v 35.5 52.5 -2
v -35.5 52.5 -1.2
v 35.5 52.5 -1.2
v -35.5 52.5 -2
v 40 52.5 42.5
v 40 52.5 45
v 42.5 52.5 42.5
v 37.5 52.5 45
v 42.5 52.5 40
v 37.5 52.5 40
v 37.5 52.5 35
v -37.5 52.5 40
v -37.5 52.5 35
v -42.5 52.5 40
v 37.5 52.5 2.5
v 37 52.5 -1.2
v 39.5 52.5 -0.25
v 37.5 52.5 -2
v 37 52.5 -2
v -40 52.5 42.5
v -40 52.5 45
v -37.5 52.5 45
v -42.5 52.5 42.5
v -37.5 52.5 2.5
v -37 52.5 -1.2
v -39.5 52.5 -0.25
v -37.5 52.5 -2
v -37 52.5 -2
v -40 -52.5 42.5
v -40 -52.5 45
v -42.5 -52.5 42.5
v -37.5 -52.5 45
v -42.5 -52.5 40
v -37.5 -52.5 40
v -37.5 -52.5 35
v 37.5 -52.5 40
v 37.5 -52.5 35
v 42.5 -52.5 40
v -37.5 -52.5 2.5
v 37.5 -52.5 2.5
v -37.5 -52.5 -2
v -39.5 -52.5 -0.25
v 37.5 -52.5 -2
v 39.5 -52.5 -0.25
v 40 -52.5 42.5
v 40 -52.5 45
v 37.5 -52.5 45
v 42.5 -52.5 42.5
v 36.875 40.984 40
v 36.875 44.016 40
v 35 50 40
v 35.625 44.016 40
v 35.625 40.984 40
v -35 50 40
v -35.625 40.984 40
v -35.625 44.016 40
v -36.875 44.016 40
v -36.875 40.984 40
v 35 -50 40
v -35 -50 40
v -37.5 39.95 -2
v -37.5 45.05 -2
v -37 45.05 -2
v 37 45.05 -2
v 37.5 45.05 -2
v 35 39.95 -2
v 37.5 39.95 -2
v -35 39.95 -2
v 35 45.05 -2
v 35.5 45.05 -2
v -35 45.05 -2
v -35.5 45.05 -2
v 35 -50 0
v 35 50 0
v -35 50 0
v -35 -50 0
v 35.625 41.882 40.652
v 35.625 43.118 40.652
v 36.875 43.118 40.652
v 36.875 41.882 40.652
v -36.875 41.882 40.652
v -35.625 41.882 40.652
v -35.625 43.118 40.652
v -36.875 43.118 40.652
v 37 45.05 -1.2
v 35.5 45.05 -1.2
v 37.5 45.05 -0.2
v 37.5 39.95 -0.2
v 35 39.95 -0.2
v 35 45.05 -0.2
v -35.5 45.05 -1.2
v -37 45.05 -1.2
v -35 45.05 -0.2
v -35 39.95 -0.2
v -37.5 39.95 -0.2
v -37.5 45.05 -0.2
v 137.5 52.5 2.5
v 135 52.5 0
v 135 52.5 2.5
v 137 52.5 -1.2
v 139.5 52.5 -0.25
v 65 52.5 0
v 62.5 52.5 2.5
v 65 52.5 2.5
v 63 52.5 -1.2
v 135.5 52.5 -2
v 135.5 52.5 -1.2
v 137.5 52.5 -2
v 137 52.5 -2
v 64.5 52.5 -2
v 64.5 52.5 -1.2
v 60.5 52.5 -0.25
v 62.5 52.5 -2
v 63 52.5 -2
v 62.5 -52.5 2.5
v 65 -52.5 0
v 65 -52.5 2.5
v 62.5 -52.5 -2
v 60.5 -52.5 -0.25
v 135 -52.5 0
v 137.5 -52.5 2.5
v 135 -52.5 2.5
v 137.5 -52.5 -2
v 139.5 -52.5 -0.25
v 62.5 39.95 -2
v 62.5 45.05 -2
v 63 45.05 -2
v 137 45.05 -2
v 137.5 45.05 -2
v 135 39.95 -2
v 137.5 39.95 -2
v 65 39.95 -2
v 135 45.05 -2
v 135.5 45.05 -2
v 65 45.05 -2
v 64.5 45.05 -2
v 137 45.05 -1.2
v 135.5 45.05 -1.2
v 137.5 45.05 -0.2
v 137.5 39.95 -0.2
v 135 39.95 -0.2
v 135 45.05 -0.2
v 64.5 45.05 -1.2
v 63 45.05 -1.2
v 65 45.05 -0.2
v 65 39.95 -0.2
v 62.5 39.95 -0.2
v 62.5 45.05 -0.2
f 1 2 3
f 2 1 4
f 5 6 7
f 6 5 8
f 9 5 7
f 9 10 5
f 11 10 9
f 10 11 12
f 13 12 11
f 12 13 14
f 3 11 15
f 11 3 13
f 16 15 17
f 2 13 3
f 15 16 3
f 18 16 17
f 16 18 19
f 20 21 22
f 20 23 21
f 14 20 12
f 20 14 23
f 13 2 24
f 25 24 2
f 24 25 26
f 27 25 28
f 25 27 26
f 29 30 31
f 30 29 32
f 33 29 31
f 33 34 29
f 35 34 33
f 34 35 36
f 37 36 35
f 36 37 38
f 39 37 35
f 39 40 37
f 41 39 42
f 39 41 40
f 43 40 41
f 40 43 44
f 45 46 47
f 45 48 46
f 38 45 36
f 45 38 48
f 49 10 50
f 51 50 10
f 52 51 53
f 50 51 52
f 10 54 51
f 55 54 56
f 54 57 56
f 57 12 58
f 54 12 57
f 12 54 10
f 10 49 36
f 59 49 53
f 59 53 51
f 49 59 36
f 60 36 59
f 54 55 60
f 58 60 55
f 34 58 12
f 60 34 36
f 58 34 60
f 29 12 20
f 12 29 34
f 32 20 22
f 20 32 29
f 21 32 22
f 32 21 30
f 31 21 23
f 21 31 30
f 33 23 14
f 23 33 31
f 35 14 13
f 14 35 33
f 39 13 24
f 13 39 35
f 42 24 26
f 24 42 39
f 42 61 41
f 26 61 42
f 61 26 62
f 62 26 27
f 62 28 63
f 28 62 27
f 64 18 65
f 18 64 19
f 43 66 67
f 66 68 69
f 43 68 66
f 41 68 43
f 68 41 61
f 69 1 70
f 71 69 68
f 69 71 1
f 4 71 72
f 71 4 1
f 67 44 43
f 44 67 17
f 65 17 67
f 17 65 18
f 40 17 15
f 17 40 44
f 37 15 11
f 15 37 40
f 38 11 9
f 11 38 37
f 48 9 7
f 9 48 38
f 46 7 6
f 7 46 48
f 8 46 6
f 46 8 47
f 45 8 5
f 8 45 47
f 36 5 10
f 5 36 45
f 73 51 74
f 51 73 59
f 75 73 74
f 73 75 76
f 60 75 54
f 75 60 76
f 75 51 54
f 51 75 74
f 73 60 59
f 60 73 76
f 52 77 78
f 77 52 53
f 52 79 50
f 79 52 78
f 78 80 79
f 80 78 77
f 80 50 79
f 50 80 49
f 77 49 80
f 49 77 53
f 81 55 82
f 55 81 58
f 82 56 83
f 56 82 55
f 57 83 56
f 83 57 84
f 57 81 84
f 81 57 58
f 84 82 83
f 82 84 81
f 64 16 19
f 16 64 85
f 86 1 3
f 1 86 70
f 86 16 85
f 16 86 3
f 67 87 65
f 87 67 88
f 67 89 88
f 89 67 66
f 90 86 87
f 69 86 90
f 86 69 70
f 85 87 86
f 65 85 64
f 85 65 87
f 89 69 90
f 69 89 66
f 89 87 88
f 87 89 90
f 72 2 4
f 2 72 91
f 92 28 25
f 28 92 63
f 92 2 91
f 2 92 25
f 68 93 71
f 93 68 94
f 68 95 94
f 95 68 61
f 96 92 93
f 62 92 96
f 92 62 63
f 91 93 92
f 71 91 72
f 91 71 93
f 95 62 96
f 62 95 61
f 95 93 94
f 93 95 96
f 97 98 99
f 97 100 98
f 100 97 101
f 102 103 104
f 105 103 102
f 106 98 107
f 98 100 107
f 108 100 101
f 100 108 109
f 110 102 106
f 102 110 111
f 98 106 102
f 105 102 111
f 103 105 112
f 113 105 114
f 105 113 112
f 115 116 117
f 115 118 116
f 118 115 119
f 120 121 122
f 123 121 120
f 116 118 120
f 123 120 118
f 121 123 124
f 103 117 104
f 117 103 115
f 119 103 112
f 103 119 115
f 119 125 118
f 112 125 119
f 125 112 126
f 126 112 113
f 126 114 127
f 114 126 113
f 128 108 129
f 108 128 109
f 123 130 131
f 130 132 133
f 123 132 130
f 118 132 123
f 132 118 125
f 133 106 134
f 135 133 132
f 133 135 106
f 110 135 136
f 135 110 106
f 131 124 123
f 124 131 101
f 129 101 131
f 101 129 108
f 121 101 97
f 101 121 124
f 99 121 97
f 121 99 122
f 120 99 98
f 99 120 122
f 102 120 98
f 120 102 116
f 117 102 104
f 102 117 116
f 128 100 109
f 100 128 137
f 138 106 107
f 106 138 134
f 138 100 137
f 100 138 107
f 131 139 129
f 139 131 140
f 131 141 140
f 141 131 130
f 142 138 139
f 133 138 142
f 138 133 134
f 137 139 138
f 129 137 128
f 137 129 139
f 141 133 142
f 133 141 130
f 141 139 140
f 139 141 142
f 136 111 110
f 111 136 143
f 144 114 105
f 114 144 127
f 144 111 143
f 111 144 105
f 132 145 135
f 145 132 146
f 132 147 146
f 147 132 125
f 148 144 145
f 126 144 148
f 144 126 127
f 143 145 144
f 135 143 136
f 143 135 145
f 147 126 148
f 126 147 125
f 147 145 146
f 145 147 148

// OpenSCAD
// card width
card_x = 70; // [45: 120]

//card height
card_y = 100; // [45: 120]

// wall thickness
thickness = 2.5; // [1.5:0.1:3.5]

// box inner height
inner_h = 40; // [20:100]

image_file = "image.png"; // [image_surface:150x150]

module card_box(card_x, card_y, thickness, inner_height) {
    p1 = [0,0];
    p2 = p1 + [0, inner_height];
    p3 = p2 + [-thickness, 0];
    p4 = p3 + [-thickness, thickness];
    p5 = p4 + [thickness, thickness];
    p6 = p5 + [-thickness, 0];
    p7 = p6 + [-thickness, -thickness];
    p8 = p7 + [0, -thickness];
    p9 = p8 + [2*thickness, -2*thickness];
    p10 = p9 + [0, -inner_height+(3*thickness)];
    p11 = p10 + [-thickness*0.8, -thickness*1.1];
    p12 = p10 + [0, -1.8*thickness];
    p13 = p12 + [thickness+card_x/2,0];
    p14 = p13 + [0, thickness*0.8];

    p=[p1,p2,p3,p4,p5,p6,p7,p8,p9,p10,p11,p12,p13,p14];
    difference() {
        union() {
            linear_extrude(height = card_y+2*thickness, center=true) {
                union() {
                    translate([-card_x/2,0,0]) polygon(points=p);
                    mirror([1,0,0]) translate([-card_x/2,0,0]) polygon(points=p);
                }
            }
            translate([0,inner_height/2,-card_y/2-thickness/2]) cube(size=[card_x, inner_height, thickness], center=true);
            translate([0,inner_height/2,card_y/2+thickness/2]) cube(size=[card_x, inner_height, thickness], center=true);
            translate([card_x/2+thickness/2, inner_height-1.25, (-card_y/2)*0.85]) rotate([0,90,0]) cylinder(h=thickness*0.5, r=2, center=true, $fn=10);
            translate([-card_x/2-thickness/2, inner_height-1.25, (-card_y/2)*0.85]) rotate([0,90,0]) cylinder(h=thickness*0.5, r=2, center=true, $fn=10);
        }
        translate([card_x/2+thickness/2, -2.2, (-thickness*1.01)+(-card_y/2)*0.925]) cube([thickness*0.6,2,(card_y/2)*0.15], center=true);
        translate([card_x/2+thickness/2, -2.2, (-card_y/2)*0.85]) cube([thickness,4,5.1], center=true);
        translate([-card_x/2-thickness/2, -2.2, (-thickness*1.01)+(-card_y/2)*0.925]) cube([thickness*0.6,2,(card_y/2)*0.15], center=true);
        translate([-card_x/2-thickness/2, -2.2, (-card_y/2)*0.85]) cube([thickness,4,5.1], center=true);
    }
}

module card_box_cap(card_x, card_y, thickness) {
    p1 = [0,0];
    p2 = p1 + [0,thickness];
    p3 = p2 +  [-thickness, 0];
    p4 = p3 + [-thickness*0.8, -thickness*1.1];
    p5 = p3 + [0, -1.8*thickness];
    p6 = p5 + [thickness+card_x/2,0];
    p7 = p6 + [0, thickness*0.8];
    
    p = [p1,p2,p3,p4,p5,p6,p7];
    
    difference() {
        union() {
            linear_extrude(height = card_y+2*thickness, center=true) {
                union() {
                    translate([-card_x/2,0,0]) polygon(points=p);
                    mirror([1,0,0]) translate([-card_x/2,0,0]) polygon(points=p);
                }
            }

            scale([0.4,thickness*0.8,0.4]) rotate([-90,0,0])  surface(file=image_file, center=true, invert=true);
        }
        translate([card_x/2+thickness/2, -2.2, (-thickness*1.01)+(-card_y/2)*0.925]) cube([thickness*0.6,2,(card_y/2)*0.15], center=true);
        translate([card_x/2+thickness/2, -2.2, (-card_y/2)*0.85]) cube([thickness,4,5.1], center=true);
        translate([-card_x/2-thickness/2, -2.2, (-thickness*1.01)+(-card_y/2)*0.925]) cube([thickness*0.6,2,(card_y/2)*0.15], center=true);
        translate([-card_x/2-thickness/2, -2.2, (-card_y/2)*0.85]) cube([thickness,4,5.1], center=true);
    }
}
rotate([90,0,0]) {
    card_box(card_x, card_y, thickness, inner_h);
    translate([card_x +30,0,0]) card_box_cap(card_x, card_y, thickness);
}
